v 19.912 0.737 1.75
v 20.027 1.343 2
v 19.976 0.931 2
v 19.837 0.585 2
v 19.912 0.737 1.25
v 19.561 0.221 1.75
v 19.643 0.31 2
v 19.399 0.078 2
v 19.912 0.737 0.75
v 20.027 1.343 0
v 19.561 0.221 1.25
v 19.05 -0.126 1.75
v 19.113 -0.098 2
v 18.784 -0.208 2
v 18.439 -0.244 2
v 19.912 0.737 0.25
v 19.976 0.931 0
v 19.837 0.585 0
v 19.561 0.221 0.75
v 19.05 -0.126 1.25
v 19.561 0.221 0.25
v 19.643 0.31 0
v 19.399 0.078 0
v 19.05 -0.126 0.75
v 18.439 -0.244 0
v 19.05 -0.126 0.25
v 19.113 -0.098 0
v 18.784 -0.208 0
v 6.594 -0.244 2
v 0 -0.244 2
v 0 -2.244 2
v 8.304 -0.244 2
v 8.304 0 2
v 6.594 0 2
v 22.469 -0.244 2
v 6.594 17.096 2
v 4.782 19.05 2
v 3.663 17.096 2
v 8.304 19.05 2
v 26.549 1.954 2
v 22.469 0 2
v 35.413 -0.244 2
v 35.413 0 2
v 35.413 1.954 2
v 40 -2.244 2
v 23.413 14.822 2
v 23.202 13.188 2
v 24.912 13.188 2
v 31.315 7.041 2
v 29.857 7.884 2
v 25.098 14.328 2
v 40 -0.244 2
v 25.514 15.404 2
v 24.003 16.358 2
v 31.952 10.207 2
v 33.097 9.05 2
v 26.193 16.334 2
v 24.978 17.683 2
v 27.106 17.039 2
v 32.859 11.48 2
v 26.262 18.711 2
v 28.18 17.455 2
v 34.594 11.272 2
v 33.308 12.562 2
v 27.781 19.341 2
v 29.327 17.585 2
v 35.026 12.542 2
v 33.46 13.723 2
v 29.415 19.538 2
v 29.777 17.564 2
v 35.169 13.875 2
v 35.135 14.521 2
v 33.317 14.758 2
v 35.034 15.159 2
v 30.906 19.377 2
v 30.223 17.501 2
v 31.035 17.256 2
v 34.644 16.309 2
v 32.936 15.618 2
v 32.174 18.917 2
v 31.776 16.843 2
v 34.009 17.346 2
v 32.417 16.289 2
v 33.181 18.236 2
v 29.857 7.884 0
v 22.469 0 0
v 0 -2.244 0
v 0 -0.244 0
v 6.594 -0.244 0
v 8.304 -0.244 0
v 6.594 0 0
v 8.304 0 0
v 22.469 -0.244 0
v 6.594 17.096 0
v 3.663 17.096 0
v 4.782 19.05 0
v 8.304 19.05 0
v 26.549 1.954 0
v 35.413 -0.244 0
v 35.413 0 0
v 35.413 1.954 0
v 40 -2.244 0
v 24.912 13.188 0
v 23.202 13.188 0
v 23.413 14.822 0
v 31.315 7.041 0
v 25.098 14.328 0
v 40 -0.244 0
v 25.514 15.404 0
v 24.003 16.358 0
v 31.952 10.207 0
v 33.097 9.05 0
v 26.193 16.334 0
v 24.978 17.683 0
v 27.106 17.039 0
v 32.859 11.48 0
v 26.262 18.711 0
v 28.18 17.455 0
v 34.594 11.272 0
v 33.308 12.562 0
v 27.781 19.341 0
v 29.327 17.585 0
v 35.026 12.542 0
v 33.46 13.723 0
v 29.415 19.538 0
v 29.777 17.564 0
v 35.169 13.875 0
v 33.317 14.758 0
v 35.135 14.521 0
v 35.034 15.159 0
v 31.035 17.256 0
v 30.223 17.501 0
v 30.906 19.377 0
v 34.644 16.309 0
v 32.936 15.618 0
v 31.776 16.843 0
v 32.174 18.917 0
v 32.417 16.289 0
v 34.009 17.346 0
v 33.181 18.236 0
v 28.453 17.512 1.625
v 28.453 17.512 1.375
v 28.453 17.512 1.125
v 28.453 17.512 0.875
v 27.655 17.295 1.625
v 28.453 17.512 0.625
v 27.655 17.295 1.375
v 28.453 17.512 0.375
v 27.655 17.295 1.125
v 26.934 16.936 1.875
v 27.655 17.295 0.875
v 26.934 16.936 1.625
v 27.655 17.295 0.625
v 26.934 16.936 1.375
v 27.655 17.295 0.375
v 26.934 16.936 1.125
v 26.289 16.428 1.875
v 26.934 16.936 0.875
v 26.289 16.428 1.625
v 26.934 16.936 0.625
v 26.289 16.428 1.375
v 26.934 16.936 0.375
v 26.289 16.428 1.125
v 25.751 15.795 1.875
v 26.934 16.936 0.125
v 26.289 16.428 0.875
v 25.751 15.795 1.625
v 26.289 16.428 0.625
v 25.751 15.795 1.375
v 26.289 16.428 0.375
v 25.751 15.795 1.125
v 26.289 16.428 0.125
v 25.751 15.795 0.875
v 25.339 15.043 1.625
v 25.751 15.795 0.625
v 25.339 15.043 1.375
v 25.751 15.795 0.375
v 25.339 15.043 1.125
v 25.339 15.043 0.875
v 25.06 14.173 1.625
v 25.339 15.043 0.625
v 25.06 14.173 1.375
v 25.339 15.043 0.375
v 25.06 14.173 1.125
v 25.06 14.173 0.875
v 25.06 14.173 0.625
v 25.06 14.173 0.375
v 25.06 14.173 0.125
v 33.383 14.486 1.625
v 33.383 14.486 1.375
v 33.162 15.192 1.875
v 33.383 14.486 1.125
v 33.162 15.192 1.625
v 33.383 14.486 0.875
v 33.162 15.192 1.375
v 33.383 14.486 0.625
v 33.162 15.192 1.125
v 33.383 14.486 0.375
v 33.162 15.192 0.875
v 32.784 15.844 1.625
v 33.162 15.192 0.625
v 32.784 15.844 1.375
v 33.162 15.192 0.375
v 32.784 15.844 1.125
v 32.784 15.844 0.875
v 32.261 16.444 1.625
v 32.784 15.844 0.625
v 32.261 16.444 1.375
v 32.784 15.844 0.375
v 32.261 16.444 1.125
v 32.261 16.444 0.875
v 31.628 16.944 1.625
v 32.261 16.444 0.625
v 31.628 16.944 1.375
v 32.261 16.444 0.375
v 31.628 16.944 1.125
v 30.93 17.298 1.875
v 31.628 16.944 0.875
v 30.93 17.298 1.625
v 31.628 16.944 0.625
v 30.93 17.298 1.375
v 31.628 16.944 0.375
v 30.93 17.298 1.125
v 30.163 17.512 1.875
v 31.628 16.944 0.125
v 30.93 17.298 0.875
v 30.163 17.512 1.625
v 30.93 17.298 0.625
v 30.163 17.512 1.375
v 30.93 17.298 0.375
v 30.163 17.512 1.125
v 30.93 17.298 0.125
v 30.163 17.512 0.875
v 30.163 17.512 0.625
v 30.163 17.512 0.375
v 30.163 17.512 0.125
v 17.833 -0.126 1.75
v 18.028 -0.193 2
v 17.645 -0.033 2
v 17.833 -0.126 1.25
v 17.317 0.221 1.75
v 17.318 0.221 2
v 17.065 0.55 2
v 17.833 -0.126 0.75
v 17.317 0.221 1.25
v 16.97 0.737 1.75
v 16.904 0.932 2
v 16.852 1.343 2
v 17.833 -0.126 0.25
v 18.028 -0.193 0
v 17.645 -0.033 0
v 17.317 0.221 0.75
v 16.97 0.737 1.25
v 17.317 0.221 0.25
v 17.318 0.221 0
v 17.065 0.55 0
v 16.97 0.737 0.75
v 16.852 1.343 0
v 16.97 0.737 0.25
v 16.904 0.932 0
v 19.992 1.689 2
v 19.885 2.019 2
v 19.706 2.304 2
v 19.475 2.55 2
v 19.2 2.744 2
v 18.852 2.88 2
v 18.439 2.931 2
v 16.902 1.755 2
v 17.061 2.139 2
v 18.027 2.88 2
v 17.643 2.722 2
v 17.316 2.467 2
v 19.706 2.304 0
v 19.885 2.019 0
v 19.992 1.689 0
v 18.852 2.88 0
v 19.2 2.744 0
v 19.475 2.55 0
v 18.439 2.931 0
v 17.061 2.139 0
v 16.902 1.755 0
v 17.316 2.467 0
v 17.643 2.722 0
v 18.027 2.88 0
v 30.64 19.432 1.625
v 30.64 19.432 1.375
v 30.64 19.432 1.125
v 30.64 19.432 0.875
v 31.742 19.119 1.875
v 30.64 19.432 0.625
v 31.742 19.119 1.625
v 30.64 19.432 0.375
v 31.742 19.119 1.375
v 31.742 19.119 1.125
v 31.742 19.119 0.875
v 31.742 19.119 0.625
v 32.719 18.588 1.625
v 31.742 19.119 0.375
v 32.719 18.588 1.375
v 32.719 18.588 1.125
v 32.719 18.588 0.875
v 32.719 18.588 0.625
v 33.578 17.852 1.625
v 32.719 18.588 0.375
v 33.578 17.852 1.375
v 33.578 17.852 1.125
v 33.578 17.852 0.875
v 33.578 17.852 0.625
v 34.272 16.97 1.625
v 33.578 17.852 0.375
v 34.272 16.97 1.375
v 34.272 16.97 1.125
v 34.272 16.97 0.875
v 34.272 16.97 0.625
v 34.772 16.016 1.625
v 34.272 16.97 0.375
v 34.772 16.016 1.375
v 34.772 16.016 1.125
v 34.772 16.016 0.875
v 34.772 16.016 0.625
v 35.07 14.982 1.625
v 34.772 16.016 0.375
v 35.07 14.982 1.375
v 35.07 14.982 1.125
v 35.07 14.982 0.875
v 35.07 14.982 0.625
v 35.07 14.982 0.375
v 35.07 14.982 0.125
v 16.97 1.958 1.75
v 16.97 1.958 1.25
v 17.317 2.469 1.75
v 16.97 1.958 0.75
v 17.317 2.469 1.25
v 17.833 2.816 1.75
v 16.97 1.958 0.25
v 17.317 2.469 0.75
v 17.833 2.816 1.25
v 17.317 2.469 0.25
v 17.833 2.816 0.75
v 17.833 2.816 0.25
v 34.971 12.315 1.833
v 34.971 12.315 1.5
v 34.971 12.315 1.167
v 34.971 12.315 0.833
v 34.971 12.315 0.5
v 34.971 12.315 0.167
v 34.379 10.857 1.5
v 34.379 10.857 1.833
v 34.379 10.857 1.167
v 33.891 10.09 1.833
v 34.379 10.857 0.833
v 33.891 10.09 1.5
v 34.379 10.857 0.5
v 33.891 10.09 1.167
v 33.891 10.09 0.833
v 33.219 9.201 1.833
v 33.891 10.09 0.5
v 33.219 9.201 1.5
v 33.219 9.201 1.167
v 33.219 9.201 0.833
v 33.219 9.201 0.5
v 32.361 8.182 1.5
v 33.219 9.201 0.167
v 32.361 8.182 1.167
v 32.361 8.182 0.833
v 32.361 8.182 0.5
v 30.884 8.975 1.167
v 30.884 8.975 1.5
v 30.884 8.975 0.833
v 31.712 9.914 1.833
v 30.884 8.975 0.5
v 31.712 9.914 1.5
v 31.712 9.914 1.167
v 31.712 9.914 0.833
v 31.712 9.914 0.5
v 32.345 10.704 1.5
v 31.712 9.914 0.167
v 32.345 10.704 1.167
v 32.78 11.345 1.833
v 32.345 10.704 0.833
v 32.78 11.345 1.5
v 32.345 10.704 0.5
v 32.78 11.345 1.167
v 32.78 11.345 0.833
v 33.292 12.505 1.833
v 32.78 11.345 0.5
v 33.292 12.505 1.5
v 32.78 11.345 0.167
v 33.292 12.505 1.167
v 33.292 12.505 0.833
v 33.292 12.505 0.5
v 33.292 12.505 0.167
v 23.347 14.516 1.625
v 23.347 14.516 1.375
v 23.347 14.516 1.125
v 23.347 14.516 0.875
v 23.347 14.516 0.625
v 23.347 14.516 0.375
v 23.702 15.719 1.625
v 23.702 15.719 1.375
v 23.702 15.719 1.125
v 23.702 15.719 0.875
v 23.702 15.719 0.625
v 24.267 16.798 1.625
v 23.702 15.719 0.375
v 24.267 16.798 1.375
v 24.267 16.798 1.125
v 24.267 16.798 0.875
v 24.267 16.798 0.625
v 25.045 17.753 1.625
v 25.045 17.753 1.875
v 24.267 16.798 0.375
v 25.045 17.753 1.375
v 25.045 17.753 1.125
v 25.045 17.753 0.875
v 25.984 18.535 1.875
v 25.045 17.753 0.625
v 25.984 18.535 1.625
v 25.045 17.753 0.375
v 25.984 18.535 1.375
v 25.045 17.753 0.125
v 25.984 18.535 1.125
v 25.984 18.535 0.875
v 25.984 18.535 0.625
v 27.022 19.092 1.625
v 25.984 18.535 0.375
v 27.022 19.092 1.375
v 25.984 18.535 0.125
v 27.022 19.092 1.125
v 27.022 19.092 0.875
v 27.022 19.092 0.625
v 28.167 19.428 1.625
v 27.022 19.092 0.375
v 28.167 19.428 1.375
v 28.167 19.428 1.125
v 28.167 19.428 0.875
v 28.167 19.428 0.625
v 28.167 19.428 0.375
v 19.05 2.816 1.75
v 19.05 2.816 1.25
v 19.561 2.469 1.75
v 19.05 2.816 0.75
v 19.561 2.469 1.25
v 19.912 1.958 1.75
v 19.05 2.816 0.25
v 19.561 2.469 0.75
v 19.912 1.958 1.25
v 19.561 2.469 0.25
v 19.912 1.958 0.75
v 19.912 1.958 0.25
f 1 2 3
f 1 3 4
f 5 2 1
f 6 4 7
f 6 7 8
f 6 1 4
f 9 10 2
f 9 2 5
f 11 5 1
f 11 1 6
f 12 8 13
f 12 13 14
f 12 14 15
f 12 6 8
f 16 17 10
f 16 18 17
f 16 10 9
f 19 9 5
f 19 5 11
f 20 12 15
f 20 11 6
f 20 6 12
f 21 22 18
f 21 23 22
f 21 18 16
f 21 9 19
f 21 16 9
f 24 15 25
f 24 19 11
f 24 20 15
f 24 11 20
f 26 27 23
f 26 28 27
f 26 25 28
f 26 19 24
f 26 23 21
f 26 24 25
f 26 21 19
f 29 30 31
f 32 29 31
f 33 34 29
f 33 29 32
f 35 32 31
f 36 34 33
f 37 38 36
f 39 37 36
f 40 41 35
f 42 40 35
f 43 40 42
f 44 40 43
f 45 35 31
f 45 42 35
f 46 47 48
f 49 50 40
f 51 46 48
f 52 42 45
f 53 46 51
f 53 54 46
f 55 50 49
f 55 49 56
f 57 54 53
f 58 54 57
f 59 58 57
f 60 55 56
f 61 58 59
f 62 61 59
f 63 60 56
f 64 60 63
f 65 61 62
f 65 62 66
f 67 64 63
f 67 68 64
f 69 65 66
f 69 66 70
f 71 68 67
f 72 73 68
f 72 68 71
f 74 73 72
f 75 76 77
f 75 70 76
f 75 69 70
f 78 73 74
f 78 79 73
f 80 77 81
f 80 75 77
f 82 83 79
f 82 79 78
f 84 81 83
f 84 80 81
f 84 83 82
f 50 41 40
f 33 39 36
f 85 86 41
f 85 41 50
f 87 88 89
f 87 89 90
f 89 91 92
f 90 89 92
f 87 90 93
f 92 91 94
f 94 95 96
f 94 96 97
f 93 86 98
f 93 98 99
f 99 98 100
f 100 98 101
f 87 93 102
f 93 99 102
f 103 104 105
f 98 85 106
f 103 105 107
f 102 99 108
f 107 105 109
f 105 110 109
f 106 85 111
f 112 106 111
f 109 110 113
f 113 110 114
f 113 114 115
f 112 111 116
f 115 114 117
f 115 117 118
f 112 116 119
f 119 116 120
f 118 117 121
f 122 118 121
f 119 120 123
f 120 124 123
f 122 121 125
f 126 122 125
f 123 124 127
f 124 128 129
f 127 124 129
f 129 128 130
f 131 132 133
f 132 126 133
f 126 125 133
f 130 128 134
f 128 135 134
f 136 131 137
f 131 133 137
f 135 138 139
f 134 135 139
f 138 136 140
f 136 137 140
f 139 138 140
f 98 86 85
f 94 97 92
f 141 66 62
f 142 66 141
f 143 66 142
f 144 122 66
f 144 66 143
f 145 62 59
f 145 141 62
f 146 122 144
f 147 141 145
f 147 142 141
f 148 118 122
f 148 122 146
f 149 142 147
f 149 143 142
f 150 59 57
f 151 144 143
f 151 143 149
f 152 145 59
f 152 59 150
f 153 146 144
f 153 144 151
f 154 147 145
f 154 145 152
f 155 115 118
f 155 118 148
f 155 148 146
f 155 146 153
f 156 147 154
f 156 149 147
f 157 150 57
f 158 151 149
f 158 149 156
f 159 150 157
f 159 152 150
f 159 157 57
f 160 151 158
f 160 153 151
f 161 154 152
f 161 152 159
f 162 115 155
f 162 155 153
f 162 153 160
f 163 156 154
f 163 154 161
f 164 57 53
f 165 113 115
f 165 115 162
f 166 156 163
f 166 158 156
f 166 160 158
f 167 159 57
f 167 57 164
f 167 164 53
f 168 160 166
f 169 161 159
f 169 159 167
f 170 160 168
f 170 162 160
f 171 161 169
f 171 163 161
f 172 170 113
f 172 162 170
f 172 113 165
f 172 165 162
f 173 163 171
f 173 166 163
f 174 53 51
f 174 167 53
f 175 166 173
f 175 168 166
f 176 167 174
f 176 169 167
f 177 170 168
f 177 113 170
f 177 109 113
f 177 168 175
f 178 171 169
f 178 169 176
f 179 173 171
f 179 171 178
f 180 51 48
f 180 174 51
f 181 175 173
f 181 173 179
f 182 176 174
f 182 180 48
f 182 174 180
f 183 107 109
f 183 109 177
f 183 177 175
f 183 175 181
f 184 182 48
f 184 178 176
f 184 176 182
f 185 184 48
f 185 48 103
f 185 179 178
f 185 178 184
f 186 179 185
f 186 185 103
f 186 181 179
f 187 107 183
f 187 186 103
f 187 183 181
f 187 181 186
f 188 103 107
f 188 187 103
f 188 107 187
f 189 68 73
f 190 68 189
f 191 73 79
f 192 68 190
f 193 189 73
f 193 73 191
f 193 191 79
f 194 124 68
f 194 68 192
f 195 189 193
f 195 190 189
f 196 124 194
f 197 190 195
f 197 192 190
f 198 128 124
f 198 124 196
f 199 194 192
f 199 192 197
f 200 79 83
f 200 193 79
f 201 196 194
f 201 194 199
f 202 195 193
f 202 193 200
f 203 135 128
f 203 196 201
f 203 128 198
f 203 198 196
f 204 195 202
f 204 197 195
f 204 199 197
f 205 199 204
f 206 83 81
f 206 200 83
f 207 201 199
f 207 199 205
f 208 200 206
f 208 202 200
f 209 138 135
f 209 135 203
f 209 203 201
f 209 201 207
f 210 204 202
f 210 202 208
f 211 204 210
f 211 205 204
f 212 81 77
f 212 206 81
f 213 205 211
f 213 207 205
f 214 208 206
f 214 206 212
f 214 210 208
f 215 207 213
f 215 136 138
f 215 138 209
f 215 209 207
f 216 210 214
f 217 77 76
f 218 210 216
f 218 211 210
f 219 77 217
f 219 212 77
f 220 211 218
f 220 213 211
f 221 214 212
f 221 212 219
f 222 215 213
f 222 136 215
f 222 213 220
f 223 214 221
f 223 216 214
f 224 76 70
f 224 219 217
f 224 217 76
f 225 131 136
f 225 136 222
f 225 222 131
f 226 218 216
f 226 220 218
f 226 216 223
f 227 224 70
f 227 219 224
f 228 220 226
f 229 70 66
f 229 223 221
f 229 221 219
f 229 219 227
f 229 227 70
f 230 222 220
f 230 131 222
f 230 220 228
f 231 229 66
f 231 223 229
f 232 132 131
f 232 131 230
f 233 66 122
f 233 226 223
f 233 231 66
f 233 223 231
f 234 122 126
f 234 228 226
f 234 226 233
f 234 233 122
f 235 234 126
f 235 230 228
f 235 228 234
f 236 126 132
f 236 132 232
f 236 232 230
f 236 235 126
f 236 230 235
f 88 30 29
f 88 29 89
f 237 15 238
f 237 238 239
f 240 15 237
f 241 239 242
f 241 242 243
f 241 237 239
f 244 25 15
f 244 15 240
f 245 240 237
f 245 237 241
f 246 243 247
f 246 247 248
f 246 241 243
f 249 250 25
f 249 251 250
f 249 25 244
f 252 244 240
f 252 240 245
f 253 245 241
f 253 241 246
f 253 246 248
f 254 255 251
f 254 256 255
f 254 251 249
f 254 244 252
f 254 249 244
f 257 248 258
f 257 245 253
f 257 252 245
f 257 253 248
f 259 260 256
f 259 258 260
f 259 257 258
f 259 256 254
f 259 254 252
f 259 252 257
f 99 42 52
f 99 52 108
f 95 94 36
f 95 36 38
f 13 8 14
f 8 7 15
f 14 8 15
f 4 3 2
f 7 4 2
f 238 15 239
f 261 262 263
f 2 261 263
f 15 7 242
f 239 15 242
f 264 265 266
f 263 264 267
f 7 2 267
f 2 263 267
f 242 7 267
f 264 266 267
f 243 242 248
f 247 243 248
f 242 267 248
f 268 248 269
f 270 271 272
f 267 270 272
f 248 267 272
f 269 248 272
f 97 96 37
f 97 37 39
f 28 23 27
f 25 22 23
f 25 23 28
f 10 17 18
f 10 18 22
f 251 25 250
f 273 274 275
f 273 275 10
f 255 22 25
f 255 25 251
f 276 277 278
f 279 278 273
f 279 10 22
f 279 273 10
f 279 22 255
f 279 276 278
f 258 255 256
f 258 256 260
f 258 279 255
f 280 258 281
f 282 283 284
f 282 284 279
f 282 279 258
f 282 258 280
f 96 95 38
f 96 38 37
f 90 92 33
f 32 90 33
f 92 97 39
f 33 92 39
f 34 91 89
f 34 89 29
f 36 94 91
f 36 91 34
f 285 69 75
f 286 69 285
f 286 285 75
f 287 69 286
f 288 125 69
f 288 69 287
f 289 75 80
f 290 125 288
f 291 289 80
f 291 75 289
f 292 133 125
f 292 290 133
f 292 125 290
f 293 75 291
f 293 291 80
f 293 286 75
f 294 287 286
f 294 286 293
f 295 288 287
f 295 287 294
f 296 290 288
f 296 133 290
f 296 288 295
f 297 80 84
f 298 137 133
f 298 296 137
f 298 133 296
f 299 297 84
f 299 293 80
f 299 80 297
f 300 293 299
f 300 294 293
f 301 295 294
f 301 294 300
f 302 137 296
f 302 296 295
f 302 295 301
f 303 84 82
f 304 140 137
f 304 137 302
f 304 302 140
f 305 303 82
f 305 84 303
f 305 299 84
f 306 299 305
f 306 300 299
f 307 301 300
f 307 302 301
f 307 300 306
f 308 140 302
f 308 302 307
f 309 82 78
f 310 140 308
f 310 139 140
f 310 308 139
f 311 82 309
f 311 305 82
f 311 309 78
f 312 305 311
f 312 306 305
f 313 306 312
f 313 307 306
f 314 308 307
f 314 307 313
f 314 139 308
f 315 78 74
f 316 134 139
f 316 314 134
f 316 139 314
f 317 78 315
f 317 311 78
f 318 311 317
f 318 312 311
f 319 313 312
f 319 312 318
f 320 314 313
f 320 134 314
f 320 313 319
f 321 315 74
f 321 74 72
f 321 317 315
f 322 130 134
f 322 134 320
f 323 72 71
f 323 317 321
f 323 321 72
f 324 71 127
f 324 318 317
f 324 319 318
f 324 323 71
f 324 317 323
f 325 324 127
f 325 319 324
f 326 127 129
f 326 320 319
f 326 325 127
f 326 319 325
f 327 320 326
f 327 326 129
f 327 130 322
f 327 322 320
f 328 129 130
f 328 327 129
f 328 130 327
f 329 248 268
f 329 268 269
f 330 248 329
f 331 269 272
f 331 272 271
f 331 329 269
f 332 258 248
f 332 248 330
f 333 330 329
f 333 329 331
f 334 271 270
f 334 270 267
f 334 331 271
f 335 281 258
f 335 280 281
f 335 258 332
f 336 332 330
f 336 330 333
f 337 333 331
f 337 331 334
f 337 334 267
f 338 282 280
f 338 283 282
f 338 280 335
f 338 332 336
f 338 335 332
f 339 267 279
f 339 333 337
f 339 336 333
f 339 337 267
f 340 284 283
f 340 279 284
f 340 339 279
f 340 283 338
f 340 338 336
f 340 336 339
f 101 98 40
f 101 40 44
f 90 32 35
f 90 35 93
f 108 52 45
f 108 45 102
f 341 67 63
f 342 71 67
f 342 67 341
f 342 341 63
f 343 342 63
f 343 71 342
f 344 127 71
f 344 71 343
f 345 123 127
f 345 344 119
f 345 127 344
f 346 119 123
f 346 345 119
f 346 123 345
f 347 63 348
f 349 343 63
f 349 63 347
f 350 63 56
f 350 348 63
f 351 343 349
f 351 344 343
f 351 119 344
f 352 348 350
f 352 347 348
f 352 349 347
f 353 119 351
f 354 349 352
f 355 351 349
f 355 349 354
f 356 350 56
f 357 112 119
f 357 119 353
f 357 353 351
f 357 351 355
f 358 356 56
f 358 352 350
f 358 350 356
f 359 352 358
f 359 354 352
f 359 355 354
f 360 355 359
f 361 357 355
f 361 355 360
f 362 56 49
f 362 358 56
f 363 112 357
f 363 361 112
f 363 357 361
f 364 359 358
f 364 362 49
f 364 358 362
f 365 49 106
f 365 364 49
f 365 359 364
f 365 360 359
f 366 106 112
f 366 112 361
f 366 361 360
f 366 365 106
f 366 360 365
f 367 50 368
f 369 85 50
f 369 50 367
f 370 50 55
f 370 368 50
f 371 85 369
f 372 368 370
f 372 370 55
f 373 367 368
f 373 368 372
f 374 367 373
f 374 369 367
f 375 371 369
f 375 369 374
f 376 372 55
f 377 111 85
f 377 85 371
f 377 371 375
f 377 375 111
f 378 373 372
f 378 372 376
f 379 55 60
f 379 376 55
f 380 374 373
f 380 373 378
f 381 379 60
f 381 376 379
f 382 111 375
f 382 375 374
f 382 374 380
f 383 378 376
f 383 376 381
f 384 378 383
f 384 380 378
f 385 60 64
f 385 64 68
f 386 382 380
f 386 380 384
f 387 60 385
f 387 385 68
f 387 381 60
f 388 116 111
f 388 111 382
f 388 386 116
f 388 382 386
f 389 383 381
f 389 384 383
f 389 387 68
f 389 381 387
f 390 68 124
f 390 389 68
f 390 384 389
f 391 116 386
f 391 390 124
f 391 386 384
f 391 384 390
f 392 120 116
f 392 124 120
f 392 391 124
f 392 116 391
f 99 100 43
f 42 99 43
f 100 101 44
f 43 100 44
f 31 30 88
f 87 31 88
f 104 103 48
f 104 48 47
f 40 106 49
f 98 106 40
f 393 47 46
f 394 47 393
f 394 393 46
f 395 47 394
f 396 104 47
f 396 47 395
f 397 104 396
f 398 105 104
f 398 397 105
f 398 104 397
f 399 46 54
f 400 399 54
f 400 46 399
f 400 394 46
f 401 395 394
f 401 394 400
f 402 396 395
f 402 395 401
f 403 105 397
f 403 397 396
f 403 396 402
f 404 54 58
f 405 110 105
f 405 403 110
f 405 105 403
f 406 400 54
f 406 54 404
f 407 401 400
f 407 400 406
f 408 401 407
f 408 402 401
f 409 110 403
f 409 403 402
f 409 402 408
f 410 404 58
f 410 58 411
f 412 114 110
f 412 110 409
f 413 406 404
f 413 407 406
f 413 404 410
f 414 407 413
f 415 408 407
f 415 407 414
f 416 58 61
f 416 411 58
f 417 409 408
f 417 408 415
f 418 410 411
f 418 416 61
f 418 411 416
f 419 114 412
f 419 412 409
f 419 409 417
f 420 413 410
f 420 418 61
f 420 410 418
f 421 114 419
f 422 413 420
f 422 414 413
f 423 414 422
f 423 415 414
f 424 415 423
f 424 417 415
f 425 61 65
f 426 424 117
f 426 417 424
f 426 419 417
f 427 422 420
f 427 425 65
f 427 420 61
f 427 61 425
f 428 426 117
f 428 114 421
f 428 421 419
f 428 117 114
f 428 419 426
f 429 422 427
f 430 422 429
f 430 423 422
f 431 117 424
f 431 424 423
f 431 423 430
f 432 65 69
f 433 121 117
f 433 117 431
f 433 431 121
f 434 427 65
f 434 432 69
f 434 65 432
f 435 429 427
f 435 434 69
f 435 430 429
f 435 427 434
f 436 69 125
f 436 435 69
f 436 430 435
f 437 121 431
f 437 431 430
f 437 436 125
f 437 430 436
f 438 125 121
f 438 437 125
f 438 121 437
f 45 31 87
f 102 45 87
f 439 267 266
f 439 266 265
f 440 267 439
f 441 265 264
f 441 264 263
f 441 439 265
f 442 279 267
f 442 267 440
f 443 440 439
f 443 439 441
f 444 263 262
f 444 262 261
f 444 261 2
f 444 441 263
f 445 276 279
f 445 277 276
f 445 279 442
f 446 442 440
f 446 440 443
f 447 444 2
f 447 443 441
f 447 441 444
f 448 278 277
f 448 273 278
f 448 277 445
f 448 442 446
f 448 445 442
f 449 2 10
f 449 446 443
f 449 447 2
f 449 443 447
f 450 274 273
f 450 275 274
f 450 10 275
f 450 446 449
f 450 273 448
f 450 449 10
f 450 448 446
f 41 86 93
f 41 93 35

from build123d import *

# Parameters (mm, degrees)
RESSALTO_EXTRUS_O1_DEPTH   = 2
RESSALTO_EXTRUS_O1_2_DEPTH = 2
RESSALTO_EXTRUS_O1_3_DEPTH = 2
ESBO_O2_W                  = 2
ESBO_O2_H                  = 2
RESSALTO_EXTRUS_O2_DEPTH   = 40
ESBO_O3_W                  = 1.709615385
ESBO_O3_H                  = 2
ESBO_O3_W_2                = 12.944230769
RESSALTO_EXTRUS_O3_DEPTH   = 0.244230769


with BuildPart() as part:
    # Esboço1 → Ressalto-extrusão1 (new body)
    with BuildSketch(Plane.XY):
        Polygon((4.781580529, 19.05), (8.303846154, 19.05), (8.303846154, 0), (6.594230769, 0), (6.594230769, 17.096153846), (3.663461538, 17.096153846), align=None)
    extrude(amount=RESSALTO_EXTRUS_O1_DEPTH)



with BuildPart() as body_2:
    # Esboço1 → Ressalto-extrus_o1 2 (new body)
    with BuildSketch(Plane.XY):
        with BuildLine():
            add(Edge.make_bspline(
                [(18.439423077, 2.930769231), (18.545505517, 2.924465495), (18.75346774, 2.912107758), (19.054126424, 2.827326148), (19.326240215, 2.67678401), (19.568622862, 2.476145174), (19.76841097, 2.232873064), (19.924318086, 1.962929618), (20.008361163, 1.659753807), (20.020628883, 1.450586576), (20.026923077, 1.343269231)],
                knots=[0, 0, 0, 0, 1.020151414, 1.999887582, 2.974338812, 3.990962822, 5.007586832, 5.987933904, 6.967670073, 8, 8, 8, 8], degree=3))
            add(Edge.make_bspline(
                [(20.026923077, 1.343269231), (20.020415593, 1.238530536), (20.00758293, 1.031987368), (19.924510734, 0.731098264), (19.767222775, 0.460986113), (19.570000885, 0.214413047), (19.326180297, 0.013349165), (19.053483104, -0.135912183), (18.754173542, -0.226764245), (18.545623268, -0.238337376), (18.439423077, -0.244230769)],
                knots=[0, 0, 0, 0, 1.009421747, 1.99056486, 2.972319754, 3.999869655, 5.017953583, 5.993804169, 6.978383603, 8, 8, 8, 8], degree=3))
            add(Edge.make_bspline(
                [(18.439423077, -0.244230769), (18.333146362, -0.238550619), (18.125666375, -0.227461478), (17.827474035, -0.134046775), (17.553116106, 0.011949487), (17.309342989, 0.214787952), (17.110469308, 0.459717304), (16.960108296, 0.73295851), (16.869810485, 1.031126048), (16.857934864, 1.23836089), (16.851923077, 1.343269231)],
                knots=[0, 0, 0, 0, 1.022052826, 1.995314843, 2.982371812, 4.00089066, 5.028879526, 6.005146991, 6.990147033, 8, 8, 8, 8], degree=3))
            add(Edge.make_bspline(
                [(16.851923077, 1.343269231), (16.857703931, 1.450762283), (16.86899034, 1.660629275), (16.960297863, 1.961070131), (17.109302673, 2.234129779), (17.310717752, 2.475774022), (17.553057134, 2.678179198), (17.826812193, 2.825489001), (18.126384548, 2.912794673), (18.333267213, 2.9246738), (18.439423077, 2.930769231)],
                knots=[0, 0, 0, 0, 1.032775665, 2.016367738, 2.991239715, 4.008302682, 5.025365648, 6.011011707, 6.979408107, 8, 8, 8, 8], degree=3))
        make_face()
    extrude(amount=RESSALTO_EXTRUS_O1_2_DEPTH)


with BuildPart() as body_3:
    # Esboço1 → Ressalto-extrus_o1 3 (new body)
    with BuildSketch(Plane.XY):
        with BuildLine():
            Line((24.911538462, 13.188461538), (23.201923077, 13.188461538))
            add(Edge.make_bspline(
                [(23.201923077, 13.188461538), (23.213065438, 13.415270228), (23.234948739, 13.860716457), (23.337428428, 14.510179433), (23.484063774, 15.130963409), (23.691390117, 15.718083941), (23.948871429, 16.276732306), (24.257644863, 16.804689534), (24.623371393, 17.299941576), (25.038153759, 17.75789728), (25.488651638, 18.178018201), (25.974731108, 18.540813165), (26.485516185, 18.847342205), (27.0194572, 19.103598679), (27.582578267, 19.295948411), (28.16976925, 19.43866905), (28.783609978, 19.524537446), (29.201839241, 19.533767365), (29.414543269, 19.538461538)],
                knots=[0, 0, 0, 0, 1.10065271, 2.161652631, 3.183658789, 4.190468796, 5.17591951, 6.163126047, 7.15150782, 8.156236427, 9.156009102, 10.134482811, 11.092018607, 12.041330605, 13.001268258, 13.972401359, 14.968799086, 16, 16, 16, 16], degree=3))
            add(Edge.make_bspline(
                [(29.414543269, 19.538461538), (29.623429644, 19.533571368), (30.033883908, 19.523962359), (30.63293573, 19.441443042), (31.203223575, 19.312199179), (31.743632705, 19.130868128), (32.249851428, 18.887112887), (32.72568257, 18.59430057), (33.176790983, 18.255646916), (33.582865048, 17.856936874), (33.955744737, 17.431292467), (34.277429868, 16.976879735), (34.552910087, 16.507546051), (34.782531601, 16.019712554), (34.951565729, 15.508785956), (35.079898547, 14.982204753), (35.152437756, 14.434518281), (35.163570704, 14.063824029), (35.169230769, 13.875360577)],
                knots=[0, 0, 0, 0, 1.111607364, 2.184268762, 3.212621178, 4.221274766, 5.211760367, 6.196651075, 7.1921475, 8.207485113, 9.220403448, 10.201281604, 11.166441695, 12.114753415, 13.065576456, 14.026450734, 14.996634279, 16, 16, 16, 16], degree=3))
            add(Edge.make_bspline(
                [(35.169230769, 13.875360577), (35.160014581, 13.610033077), (35.141743937, 13.0840342), (34.985455687, 12.31106759), (34.741362534, 11.562166266), (34.447462635, 10.95943895), (34.150976903, 10.473753792), (33.883800612, 10.073874126), (33.571027855, 9.643314363), (33.208106316, 9.183516283), (32.802543397, 8.690878357), (32.350665623, 8.165698185), (31.84925067, 7.613401838), (31.497323688, 7.23618135), (31.314963942, 7.040715144)],
                knots=[0, 0, 0, 0, 1.184426356, 2.348067706, 3.509069118, 4.696110526, 5.333549288, 6.050745305, 6.844228056, 7.710549037, 8.667450064, 9.695053472, 10.805634456, 12, 12, 12, 12], degree=3))
            Line((31.314963942, 7.040715144), (26.548647837, 1.953846154))
            Line((26.548647837, 1.953846154), (35.413461538, 1.953846154))
            Line((35.413461538, 1.953846154), (35.413461538, 0))
            Line((35.413461538, 0), (22.469230769, 0))
            Line((22.469230769, 0), (29.857211538, 7.884074519))
            add(Edge.make_bspline(
                [(29.857211538, 7.884074519), (30.037086465, 8.071843873), (30.382589387, 8.432510375), (30.871263127, 8.959068486), (31.31016962, 9.447562415), (31.702150001, 9.8970692), (32.038700937, 10.314163877), (32.337362657, 10.685337906), (32.576661088, 11.026901414), (32.83636917, 11.422818184), (33.087905269, 11.906210939), (33.304053949, 12.496944305), (33.43585191, 13.10505978), (33.451662515, 13.516006582), (33.459615385, 13.722716346)],
                knots=[0, 0, 0, 0, 1.329631726, 2.553950428, 3.673215718, 4.687767853, 5.603093632, 6.413772471, 7.123043292, 7.734684054, 8.834405432, 9.900288307, 10.943827018, 12, 12, 12, 12], degree=3))
            add(Edge.make_bspline(
                [(33.459615385, 13.722716346), (33.45615513, 13.852699386), (33.449335633, 14.108870997), (33.389150165, 14.484459486), (33.298197268, 14.846762258), (33.167866649, 15.196893742), (32.995835678, 15.531333648), (32.786430567, 15.850489076), (32.544821793, 16.159039015), (32.26532417, 16.448344823), (31.958284327, 16.71330967), (31.63392134, 16.948027907), (31.290748629, 17.144183638), (30.930213107, 17.304984673), (30.55331991, 17.431124962), (30.159340083, 17.518529516), (29.749362222, 17.573407036), (29.469417053, 17.580832028), (29.326772837, 17.584615385)],
                knots=[0, 0, 0, 0, 0.991446411, 1.95395049, 2.89581595, 3.838931463, 4.798493298, 5.75982156, 6.748411868, 7.785213223, 8.824556874, 9.840280684, 10.836137867, 11.835679398, 12.848801643, 13.863922112, 14.911575587, 16, 16, 16, 16], degree=3))
            add(Edge.make_bspline(
                [(29.326772837, 17.584615385), (29.177797304, 17.580723566), (28.885233956, 17.573080677), (28.455688934, 17.51961732), (28.045919202, 17.427383532), (27.654893987, 17.301236204), (27.28195167, 17.140897531), (26.928905945, 16.941189607), (26.596549362, 16.702882308), (26.284257142, 16.432695852), (25.996526056, 16.131882194), (25.743722346, 15.796547966), (25.522829355, 15.432815891), (25.330101955, 15.041667409), (25.173588842, 14.619553263), (25.053992123, 14.167971898), (24.959358, 13.688884094), (24.927743052, 13.35803956), (24.911538462, 13.188461538)],
                knots=[0, 0, 0, 0, 1.031018746, 2.02475058, 2.990194455, 3.934040569, 4.864654155, 5.795059489, 6.735614925, 7.690564532, 8.649604399, 9.611025574, 10.590972636, 11.591080095, 12.624614302, 13.701020113, 14.821632451, 16, 16, 16, 16], degree=3))
        make_face()
    extrude(amount=RESSALTO_EXTRUS_O1_3_DEPTH)


with BuildPart() as body_4:
    # Esboço2 → Ressalto-extrusão2 (new body)
    with BuildSketch(Plane(origin=(0, 0, 0), x_dir=(0, 0, -1), z_dir=(1, 0, 0))):
        with Locations((-1, -1.244230769)):
            Rectangle(ESBO_O2_W, ESBO_O2_H)
    extrude(amount=RESSALTO_EXTRUS_O2_DEPTH)


with BuildPart() as part_1:
    add(part.part)

    add(body_3.part)  # Ressalto-extrusão3 merges body 3

    add(body_4.part)  # Ressalto-extrusão3 merges body 4
    # Esboço3 → Ressalto-extrusão3 (add)
    with BuildSketch(Plane.XZ):
        with Locations((7.449038462, 1)):
            Rectangle(ESBO_O3_W, ESBO_O3_H)
        with Locations((28.941346153, 1)):
            Rectangle(ESBO_O3_W_2, ESBO_O3_H)
    extrude(amount=RESSALTO_EXTRUS_O3_DEPTH)


solid = Compound([body_2.part, part_1.part])
